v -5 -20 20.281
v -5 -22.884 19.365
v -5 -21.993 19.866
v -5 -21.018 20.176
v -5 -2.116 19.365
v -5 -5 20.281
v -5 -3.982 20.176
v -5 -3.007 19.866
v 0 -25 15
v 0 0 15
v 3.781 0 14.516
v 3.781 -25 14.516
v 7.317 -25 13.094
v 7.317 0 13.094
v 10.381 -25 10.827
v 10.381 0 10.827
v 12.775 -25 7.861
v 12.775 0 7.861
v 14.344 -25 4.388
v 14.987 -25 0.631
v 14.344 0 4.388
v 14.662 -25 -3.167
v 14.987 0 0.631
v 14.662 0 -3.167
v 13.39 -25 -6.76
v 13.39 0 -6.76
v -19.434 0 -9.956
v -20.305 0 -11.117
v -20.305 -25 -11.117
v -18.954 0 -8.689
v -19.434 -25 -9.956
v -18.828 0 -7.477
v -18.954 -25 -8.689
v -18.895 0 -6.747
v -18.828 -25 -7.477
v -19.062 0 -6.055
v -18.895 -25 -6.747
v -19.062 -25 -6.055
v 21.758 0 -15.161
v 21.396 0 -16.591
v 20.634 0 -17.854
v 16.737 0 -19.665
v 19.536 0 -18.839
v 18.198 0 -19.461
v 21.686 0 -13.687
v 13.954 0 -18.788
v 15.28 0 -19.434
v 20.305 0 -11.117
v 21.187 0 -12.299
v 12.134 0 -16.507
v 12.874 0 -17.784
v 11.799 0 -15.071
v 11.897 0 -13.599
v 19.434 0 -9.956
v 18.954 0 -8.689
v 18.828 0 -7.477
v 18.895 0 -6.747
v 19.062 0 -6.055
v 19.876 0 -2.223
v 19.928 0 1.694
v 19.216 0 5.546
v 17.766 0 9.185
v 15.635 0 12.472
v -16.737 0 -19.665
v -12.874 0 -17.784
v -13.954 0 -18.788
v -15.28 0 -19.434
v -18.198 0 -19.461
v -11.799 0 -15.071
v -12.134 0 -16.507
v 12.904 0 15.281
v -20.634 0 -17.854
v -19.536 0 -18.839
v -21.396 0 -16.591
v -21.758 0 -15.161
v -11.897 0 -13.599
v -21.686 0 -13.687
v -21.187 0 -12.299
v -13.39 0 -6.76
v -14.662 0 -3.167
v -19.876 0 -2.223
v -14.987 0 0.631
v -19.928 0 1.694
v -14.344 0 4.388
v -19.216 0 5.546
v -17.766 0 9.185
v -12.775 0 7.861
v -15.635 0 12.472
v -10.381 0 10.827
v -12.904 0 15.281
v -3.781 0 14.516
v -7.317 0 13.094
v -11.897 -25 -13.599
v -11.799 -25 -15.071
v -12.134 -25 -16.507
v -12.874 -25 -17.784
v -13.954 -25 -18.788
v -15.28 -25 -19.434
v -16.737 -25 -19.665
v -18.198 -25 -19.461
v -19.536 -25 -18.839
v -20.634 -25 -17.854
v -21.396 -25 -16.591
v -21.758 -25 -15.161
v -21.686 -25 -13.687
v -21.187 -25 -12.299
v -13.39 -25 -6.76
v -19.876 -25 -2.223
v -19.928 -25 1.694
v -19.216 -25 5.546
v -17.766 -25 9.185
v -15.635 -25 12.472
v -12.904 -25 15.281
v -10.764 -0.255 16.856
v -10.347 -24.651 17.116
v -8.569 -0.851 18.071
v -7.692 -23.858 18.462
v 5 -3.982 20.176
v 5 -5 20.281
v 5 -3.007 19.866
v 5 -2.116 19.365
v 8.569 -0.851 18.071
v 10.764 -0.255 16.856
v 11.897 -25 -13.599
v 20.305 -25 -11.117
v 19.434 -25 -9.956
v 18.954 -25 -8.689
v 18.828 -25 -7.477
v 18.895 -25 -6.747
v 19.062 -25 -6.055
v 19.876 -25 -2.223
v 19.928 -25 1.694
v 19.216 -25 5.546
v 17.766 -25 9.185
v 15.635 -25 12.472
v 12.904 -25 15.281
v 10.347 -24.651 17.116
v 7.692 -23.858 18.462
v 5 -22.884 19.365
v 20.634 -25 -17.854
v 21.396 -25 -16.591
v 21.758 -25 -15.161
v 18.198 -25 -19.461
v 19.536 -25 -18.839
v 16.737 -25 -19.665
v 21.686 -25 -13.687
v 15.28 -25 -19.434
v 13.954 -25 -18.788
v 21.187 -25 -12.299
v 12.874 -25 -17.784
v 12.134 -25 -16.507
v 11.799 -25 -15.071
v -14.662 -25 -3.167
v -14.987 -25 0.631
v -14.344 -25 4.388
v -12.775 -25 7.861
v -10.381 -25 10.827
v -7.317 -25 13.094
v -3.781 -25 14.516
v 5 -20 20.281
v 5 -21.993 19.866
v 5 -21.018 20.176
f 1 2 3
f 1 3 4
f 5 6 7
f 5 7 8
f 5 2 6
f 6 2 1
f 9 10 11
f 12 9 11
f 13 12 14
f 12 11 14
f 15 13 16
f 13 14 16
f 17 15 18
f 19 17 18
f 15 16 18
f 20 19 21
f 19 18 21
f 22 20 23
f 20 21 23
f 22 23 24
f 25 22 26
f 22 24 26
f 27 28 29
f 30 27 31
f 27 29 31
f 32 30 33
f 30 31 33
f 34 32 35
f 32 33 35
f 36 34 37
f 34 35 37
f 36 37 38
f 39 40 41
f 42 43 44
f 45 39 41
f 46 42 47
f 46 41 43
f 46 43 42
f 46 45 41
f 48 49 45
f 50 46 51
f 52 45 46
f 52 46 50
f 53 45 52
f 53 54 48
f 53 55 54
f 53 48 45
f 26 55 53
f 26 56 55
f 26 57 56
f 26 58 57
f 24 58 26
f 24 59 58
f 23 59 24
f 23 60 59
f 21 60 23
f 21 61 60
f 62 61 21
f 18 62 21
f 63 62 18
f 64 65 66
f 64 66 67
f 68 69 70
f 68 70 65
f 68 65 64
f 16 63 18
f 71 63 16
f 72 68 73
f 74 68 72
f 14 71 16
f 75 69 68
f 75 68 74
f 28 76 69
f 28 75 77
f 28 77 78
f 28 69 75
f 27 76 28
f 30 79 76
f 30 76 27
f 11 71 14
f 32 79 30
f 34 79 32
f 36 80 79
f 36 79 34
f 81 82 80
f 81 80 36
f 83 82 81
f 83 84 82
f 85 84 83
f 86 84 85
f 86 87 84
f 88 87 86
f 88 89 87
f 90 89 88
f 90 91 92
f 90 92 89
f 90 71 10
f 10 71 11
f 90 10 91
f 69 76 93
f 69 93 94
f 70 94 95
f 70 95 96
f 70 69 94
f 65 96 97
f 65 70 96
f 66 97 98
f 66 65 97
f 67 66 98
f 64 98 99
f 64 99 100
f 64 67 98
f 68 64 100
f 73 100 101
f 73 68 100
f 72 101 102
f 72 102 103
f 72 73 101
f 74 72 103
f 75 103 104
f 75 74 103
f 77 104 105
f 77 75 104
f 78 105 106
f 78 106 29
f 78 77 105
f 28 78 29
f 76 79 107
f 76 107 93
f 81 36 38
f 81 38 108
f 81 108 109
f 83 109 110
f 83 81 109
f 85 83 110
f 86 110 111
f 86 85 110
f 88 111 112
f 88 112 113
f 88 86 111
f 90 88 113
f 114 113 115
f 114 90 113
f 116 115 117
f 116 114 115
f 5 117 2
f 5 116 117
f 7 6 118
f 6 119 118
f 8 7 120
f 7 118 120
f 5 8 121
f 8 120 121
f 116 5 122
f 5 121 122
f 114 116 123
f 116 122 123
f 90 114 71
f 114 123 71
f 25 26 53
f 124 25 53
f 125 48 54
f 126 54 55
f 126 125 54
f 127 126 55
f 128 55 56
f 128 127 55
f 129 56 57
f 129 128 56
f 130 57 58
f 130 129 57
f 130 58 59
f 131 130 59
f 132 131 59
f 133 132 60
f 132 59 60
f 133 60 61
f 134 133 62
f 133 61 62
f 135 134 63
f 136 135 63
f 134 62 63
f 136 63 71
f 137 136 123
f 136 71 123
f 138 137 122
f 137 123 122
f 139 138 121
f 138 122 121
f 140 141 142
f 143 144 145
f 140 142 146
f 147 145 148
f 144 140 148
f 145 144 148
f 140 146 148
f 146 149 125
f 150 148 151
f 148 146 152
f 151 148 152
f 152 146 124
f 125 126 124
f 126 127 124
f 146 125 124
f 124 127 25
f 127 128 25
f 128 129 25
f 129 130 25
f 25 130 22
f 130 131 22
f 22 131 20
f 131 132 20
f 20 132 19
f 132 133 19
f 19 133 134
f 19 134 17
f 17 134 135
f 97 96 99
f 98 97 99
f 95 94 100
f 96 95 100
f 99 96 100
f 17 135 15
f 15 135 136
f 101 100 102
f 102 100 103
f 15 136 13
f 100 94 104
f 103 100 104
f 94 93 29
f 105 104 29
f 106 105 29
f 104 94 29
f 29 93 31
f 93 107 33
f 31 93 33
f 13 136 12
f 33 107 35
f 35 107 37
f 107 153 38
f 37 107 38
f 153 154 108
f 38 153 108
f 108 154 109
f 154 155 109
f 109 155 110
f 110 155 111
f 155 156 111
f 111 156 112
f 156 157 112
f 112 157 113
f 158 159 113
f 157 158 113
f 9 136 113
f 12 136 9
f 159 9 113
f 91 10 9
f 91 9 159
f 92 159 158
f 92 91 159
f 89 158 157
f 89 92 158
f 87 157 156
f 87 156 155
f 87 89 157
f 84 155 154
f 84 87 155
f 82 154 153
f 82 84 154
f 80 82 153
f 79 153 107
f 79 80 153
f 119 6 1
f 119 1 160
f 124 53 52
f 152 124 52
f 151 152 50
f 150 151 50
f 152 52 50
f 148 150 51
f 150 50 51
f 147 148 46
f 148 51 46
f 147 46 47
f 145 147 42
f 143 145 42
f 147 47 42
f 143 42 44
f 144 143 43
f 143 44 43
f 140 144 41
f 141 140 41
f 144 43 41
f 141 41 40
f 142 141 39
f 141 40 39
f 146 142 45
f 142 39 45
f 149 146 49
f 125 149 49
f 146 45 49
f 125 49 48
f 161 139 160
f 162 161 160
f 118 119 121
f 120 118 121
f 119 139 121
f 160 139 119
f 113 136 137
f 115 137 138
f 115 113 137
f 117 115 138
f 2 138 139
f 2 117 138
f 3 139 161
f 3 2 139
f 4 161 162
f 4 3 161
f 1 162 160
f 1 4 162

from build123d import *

# Parameters (mm, degrees)
F1_DEPTH = 25
F3_R     = 5


# Not quite as in the source:
# - a feature names something its author has since deleted; it is built from what else it names


with BuildPart() as f1:
    # F0 (on Front) → F1 (new body)
    with BuildSketch(Plane.XZ):
        with BuildLine():
            ThreePointArc((11.8972236274, -13.5987717306), (19.6369586065, -18.770230883), (17.4821764595, -9.7146027319))
            ThreePointArc((17.4821764595, -9.7146027319), (18.3784296837, 7.8888099459), (5, 19.364916731))
            Line((5, 19.364916731), (5, 20.2805753797))
            Line((5, 20.2805753797), (0, 20.2805753797))
            Line((0, 20.2805753797), (0, 20))
            Line((0, 20), (0, 15))
            ThreePointArc((0, 15), (12.7749432268, 7.86135011), (13.3904401788, -6.7598899265))
            Line((13.3904401788, -6.7598899265), (11.8972236274, -13.5987717306))
        make_face()
    extrude(amount=F1_DEPTH)

    # F2: F1 across plane


with BuildPart() as f1_1:
    add(f1.part)
    add(f1.part.mirror(Plane.YZ))

    # F3
    f3_edges = [f1_1.edges().sort_by_distance(p)[0] for p in [
        (-17.482176, -12.5, -9.714603),
        (17.482176, -12.5, -9.714603),
        (0, -25, 20.280575),
        (0, 0, 20.280575),
    ]]
    fillet(f3_edges, radius=F3_R)


solid = f1_1.part
